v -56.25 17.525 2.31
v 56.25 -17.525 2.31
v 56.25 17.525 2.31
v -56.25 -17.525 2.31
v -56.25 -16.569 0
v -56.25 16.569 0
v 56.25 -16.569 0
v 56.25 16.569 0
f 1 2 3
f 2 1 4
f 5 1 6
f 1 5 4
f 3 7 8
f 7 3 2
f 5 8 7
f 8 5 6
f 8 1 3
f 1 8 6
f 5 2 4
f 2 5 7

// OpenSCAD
// file: ../lib/project/cache_pot_geometry.scad
// Shared paneled cache pot geometry helpers.

function cache_pot_outside_height(inside_height, bottom_thickness) =
  inside_height + bottom_thickness;

function cache_pot_outside_radius(inside_radius, min_wall_thickness, num_panels) =
  (inside_radius + min_wall_thickness) / cos(180 / num_panels);

function cache_pot_panel_extra_radius(panel_thickness, num_panels) =
  panel_thickness / cos(180 / num_panels);

function cache_pot_panel_width(outside_radius, panel_thickness, num_panels) =
  (outside_radius + cache_pot_panel_extra_radius(panel_thickness, num_panels)) *
  2 * sin(180 / num_panels);

module cache_pot_outside_cylinder(outside_height, outside_radius, num_panels) {
  cylinder(outside_height, outside_radius, outside_radius, $fn = num_panels);
}

module cache_pot_inside_cutout(
  inside_height,
  inside_radius,
  bottom_thickness,
  bottom_edge_width
) {
  translate([0, 0, bottom_thickness])
    cylinder(inside_height + 1, inside_radius, inside_radius);
  translate([0, 0, -0.5 * bottom_thickness])
    cylinder(
      2 * bottom_thickness,
      inside_radius - bottom_edge_width,
      inside_radius - bottom_edge_width
    );
}

module cache_pot_core(
  inside_height,
  inside_radius,
  bottom_thickness,
  bottom_edge_width,
  outside_height,
  outside_radius,
  num_panels
) {
  difference() {
    cache_pot_outside_cylinder(outside_height, outside_radius, num_panels);
    cache_pot_inside_cutout(
      inside_height,
      inside_radius,
      bottom_thickness,
      bottom_edge_width
    );
  }
}

module cache_pot_panel_shell(
  outside_height,
  outside_radius,
  panel_thickness,
  num_panels
) {
  difference() {
    cylinder(
      outside_height,
      outside_radius + panel_thickness,
      outside_radius + panel_thickness,
      $fn = num_panels
    );
    translate([0, 0, -1])
      cylinder(outside_height + 2, outside_radius, outside_radius, $fn = num_panels);
    translate([-(outside_radius + panel_thickness + 1), 0, -1])
      cube([
        2 * (outside_radius + panel_thickness + 1),
        2 * (outside_radius + panel_thickness + 1),
        outside_height + 2
      ]);
    rotate([0, 0, 180 - 360 / num_panels])
      translate([-(outside_radius + panel_thickness + 1), 0, -1])
        cube([
          2 * (outside_radius + panel_thickness + 1),
          2 * (outside_radius + panel_thickness + 1),
          outside_height + 2
        ]);
  }
}

module cache_pot_panel_flat_on_bed(
  inside_radius,
  min_wall_thickness,
  outside_height,
  num_panels,
  outside_radius,
  panel_thickness
) {
  translate([outside_height / 2, 0, -(inside_radius + min_wall_thickness)])
    rotate([0, -90, 0])
      rotate([0, 0, 180 / num_panels])
        cache_pot_panel_shell(
          outside_height = outside_height,
          outside_radius = outside_radius,
          panel_thickness = panel_thickness,
          num_panels = num_panels
        );
}
// main file
// Paneled cache pot base panel.

use <../lib/project/cache_pot_geometry.scad>;

// ---------- Public parameters (mm) ----------
inside_radius = 75 / 2;
inside_height = 110;
min_wall_thickness = 2.5;
bottom_thickness = 2.5;
bottom_edge_width = 10;
num_panels = 8;
panel_thickness = 2.5;

// ---------- Resolution ----------
$fa = 1;
$fs = 1;

// ---------- Derived ----------
outside_height = cache_pot_outside_height(inside_height, bottom_thickness);
outside_radius = cache_pot_outside_radius(inside_radius, min_wall_thickness, num_panels);

cache_pot_panel_flat_on_bed(
  inside_radius = inside_radius,
  min_wall_thickness = min_wall_thickness,
  outside_height = outside_height,
  num_panels = num_panels,
  outside_radius = outside_radius,
  panel_thickness = panel_thickness
);
//color("red") panel();
//color("yellow") core();
